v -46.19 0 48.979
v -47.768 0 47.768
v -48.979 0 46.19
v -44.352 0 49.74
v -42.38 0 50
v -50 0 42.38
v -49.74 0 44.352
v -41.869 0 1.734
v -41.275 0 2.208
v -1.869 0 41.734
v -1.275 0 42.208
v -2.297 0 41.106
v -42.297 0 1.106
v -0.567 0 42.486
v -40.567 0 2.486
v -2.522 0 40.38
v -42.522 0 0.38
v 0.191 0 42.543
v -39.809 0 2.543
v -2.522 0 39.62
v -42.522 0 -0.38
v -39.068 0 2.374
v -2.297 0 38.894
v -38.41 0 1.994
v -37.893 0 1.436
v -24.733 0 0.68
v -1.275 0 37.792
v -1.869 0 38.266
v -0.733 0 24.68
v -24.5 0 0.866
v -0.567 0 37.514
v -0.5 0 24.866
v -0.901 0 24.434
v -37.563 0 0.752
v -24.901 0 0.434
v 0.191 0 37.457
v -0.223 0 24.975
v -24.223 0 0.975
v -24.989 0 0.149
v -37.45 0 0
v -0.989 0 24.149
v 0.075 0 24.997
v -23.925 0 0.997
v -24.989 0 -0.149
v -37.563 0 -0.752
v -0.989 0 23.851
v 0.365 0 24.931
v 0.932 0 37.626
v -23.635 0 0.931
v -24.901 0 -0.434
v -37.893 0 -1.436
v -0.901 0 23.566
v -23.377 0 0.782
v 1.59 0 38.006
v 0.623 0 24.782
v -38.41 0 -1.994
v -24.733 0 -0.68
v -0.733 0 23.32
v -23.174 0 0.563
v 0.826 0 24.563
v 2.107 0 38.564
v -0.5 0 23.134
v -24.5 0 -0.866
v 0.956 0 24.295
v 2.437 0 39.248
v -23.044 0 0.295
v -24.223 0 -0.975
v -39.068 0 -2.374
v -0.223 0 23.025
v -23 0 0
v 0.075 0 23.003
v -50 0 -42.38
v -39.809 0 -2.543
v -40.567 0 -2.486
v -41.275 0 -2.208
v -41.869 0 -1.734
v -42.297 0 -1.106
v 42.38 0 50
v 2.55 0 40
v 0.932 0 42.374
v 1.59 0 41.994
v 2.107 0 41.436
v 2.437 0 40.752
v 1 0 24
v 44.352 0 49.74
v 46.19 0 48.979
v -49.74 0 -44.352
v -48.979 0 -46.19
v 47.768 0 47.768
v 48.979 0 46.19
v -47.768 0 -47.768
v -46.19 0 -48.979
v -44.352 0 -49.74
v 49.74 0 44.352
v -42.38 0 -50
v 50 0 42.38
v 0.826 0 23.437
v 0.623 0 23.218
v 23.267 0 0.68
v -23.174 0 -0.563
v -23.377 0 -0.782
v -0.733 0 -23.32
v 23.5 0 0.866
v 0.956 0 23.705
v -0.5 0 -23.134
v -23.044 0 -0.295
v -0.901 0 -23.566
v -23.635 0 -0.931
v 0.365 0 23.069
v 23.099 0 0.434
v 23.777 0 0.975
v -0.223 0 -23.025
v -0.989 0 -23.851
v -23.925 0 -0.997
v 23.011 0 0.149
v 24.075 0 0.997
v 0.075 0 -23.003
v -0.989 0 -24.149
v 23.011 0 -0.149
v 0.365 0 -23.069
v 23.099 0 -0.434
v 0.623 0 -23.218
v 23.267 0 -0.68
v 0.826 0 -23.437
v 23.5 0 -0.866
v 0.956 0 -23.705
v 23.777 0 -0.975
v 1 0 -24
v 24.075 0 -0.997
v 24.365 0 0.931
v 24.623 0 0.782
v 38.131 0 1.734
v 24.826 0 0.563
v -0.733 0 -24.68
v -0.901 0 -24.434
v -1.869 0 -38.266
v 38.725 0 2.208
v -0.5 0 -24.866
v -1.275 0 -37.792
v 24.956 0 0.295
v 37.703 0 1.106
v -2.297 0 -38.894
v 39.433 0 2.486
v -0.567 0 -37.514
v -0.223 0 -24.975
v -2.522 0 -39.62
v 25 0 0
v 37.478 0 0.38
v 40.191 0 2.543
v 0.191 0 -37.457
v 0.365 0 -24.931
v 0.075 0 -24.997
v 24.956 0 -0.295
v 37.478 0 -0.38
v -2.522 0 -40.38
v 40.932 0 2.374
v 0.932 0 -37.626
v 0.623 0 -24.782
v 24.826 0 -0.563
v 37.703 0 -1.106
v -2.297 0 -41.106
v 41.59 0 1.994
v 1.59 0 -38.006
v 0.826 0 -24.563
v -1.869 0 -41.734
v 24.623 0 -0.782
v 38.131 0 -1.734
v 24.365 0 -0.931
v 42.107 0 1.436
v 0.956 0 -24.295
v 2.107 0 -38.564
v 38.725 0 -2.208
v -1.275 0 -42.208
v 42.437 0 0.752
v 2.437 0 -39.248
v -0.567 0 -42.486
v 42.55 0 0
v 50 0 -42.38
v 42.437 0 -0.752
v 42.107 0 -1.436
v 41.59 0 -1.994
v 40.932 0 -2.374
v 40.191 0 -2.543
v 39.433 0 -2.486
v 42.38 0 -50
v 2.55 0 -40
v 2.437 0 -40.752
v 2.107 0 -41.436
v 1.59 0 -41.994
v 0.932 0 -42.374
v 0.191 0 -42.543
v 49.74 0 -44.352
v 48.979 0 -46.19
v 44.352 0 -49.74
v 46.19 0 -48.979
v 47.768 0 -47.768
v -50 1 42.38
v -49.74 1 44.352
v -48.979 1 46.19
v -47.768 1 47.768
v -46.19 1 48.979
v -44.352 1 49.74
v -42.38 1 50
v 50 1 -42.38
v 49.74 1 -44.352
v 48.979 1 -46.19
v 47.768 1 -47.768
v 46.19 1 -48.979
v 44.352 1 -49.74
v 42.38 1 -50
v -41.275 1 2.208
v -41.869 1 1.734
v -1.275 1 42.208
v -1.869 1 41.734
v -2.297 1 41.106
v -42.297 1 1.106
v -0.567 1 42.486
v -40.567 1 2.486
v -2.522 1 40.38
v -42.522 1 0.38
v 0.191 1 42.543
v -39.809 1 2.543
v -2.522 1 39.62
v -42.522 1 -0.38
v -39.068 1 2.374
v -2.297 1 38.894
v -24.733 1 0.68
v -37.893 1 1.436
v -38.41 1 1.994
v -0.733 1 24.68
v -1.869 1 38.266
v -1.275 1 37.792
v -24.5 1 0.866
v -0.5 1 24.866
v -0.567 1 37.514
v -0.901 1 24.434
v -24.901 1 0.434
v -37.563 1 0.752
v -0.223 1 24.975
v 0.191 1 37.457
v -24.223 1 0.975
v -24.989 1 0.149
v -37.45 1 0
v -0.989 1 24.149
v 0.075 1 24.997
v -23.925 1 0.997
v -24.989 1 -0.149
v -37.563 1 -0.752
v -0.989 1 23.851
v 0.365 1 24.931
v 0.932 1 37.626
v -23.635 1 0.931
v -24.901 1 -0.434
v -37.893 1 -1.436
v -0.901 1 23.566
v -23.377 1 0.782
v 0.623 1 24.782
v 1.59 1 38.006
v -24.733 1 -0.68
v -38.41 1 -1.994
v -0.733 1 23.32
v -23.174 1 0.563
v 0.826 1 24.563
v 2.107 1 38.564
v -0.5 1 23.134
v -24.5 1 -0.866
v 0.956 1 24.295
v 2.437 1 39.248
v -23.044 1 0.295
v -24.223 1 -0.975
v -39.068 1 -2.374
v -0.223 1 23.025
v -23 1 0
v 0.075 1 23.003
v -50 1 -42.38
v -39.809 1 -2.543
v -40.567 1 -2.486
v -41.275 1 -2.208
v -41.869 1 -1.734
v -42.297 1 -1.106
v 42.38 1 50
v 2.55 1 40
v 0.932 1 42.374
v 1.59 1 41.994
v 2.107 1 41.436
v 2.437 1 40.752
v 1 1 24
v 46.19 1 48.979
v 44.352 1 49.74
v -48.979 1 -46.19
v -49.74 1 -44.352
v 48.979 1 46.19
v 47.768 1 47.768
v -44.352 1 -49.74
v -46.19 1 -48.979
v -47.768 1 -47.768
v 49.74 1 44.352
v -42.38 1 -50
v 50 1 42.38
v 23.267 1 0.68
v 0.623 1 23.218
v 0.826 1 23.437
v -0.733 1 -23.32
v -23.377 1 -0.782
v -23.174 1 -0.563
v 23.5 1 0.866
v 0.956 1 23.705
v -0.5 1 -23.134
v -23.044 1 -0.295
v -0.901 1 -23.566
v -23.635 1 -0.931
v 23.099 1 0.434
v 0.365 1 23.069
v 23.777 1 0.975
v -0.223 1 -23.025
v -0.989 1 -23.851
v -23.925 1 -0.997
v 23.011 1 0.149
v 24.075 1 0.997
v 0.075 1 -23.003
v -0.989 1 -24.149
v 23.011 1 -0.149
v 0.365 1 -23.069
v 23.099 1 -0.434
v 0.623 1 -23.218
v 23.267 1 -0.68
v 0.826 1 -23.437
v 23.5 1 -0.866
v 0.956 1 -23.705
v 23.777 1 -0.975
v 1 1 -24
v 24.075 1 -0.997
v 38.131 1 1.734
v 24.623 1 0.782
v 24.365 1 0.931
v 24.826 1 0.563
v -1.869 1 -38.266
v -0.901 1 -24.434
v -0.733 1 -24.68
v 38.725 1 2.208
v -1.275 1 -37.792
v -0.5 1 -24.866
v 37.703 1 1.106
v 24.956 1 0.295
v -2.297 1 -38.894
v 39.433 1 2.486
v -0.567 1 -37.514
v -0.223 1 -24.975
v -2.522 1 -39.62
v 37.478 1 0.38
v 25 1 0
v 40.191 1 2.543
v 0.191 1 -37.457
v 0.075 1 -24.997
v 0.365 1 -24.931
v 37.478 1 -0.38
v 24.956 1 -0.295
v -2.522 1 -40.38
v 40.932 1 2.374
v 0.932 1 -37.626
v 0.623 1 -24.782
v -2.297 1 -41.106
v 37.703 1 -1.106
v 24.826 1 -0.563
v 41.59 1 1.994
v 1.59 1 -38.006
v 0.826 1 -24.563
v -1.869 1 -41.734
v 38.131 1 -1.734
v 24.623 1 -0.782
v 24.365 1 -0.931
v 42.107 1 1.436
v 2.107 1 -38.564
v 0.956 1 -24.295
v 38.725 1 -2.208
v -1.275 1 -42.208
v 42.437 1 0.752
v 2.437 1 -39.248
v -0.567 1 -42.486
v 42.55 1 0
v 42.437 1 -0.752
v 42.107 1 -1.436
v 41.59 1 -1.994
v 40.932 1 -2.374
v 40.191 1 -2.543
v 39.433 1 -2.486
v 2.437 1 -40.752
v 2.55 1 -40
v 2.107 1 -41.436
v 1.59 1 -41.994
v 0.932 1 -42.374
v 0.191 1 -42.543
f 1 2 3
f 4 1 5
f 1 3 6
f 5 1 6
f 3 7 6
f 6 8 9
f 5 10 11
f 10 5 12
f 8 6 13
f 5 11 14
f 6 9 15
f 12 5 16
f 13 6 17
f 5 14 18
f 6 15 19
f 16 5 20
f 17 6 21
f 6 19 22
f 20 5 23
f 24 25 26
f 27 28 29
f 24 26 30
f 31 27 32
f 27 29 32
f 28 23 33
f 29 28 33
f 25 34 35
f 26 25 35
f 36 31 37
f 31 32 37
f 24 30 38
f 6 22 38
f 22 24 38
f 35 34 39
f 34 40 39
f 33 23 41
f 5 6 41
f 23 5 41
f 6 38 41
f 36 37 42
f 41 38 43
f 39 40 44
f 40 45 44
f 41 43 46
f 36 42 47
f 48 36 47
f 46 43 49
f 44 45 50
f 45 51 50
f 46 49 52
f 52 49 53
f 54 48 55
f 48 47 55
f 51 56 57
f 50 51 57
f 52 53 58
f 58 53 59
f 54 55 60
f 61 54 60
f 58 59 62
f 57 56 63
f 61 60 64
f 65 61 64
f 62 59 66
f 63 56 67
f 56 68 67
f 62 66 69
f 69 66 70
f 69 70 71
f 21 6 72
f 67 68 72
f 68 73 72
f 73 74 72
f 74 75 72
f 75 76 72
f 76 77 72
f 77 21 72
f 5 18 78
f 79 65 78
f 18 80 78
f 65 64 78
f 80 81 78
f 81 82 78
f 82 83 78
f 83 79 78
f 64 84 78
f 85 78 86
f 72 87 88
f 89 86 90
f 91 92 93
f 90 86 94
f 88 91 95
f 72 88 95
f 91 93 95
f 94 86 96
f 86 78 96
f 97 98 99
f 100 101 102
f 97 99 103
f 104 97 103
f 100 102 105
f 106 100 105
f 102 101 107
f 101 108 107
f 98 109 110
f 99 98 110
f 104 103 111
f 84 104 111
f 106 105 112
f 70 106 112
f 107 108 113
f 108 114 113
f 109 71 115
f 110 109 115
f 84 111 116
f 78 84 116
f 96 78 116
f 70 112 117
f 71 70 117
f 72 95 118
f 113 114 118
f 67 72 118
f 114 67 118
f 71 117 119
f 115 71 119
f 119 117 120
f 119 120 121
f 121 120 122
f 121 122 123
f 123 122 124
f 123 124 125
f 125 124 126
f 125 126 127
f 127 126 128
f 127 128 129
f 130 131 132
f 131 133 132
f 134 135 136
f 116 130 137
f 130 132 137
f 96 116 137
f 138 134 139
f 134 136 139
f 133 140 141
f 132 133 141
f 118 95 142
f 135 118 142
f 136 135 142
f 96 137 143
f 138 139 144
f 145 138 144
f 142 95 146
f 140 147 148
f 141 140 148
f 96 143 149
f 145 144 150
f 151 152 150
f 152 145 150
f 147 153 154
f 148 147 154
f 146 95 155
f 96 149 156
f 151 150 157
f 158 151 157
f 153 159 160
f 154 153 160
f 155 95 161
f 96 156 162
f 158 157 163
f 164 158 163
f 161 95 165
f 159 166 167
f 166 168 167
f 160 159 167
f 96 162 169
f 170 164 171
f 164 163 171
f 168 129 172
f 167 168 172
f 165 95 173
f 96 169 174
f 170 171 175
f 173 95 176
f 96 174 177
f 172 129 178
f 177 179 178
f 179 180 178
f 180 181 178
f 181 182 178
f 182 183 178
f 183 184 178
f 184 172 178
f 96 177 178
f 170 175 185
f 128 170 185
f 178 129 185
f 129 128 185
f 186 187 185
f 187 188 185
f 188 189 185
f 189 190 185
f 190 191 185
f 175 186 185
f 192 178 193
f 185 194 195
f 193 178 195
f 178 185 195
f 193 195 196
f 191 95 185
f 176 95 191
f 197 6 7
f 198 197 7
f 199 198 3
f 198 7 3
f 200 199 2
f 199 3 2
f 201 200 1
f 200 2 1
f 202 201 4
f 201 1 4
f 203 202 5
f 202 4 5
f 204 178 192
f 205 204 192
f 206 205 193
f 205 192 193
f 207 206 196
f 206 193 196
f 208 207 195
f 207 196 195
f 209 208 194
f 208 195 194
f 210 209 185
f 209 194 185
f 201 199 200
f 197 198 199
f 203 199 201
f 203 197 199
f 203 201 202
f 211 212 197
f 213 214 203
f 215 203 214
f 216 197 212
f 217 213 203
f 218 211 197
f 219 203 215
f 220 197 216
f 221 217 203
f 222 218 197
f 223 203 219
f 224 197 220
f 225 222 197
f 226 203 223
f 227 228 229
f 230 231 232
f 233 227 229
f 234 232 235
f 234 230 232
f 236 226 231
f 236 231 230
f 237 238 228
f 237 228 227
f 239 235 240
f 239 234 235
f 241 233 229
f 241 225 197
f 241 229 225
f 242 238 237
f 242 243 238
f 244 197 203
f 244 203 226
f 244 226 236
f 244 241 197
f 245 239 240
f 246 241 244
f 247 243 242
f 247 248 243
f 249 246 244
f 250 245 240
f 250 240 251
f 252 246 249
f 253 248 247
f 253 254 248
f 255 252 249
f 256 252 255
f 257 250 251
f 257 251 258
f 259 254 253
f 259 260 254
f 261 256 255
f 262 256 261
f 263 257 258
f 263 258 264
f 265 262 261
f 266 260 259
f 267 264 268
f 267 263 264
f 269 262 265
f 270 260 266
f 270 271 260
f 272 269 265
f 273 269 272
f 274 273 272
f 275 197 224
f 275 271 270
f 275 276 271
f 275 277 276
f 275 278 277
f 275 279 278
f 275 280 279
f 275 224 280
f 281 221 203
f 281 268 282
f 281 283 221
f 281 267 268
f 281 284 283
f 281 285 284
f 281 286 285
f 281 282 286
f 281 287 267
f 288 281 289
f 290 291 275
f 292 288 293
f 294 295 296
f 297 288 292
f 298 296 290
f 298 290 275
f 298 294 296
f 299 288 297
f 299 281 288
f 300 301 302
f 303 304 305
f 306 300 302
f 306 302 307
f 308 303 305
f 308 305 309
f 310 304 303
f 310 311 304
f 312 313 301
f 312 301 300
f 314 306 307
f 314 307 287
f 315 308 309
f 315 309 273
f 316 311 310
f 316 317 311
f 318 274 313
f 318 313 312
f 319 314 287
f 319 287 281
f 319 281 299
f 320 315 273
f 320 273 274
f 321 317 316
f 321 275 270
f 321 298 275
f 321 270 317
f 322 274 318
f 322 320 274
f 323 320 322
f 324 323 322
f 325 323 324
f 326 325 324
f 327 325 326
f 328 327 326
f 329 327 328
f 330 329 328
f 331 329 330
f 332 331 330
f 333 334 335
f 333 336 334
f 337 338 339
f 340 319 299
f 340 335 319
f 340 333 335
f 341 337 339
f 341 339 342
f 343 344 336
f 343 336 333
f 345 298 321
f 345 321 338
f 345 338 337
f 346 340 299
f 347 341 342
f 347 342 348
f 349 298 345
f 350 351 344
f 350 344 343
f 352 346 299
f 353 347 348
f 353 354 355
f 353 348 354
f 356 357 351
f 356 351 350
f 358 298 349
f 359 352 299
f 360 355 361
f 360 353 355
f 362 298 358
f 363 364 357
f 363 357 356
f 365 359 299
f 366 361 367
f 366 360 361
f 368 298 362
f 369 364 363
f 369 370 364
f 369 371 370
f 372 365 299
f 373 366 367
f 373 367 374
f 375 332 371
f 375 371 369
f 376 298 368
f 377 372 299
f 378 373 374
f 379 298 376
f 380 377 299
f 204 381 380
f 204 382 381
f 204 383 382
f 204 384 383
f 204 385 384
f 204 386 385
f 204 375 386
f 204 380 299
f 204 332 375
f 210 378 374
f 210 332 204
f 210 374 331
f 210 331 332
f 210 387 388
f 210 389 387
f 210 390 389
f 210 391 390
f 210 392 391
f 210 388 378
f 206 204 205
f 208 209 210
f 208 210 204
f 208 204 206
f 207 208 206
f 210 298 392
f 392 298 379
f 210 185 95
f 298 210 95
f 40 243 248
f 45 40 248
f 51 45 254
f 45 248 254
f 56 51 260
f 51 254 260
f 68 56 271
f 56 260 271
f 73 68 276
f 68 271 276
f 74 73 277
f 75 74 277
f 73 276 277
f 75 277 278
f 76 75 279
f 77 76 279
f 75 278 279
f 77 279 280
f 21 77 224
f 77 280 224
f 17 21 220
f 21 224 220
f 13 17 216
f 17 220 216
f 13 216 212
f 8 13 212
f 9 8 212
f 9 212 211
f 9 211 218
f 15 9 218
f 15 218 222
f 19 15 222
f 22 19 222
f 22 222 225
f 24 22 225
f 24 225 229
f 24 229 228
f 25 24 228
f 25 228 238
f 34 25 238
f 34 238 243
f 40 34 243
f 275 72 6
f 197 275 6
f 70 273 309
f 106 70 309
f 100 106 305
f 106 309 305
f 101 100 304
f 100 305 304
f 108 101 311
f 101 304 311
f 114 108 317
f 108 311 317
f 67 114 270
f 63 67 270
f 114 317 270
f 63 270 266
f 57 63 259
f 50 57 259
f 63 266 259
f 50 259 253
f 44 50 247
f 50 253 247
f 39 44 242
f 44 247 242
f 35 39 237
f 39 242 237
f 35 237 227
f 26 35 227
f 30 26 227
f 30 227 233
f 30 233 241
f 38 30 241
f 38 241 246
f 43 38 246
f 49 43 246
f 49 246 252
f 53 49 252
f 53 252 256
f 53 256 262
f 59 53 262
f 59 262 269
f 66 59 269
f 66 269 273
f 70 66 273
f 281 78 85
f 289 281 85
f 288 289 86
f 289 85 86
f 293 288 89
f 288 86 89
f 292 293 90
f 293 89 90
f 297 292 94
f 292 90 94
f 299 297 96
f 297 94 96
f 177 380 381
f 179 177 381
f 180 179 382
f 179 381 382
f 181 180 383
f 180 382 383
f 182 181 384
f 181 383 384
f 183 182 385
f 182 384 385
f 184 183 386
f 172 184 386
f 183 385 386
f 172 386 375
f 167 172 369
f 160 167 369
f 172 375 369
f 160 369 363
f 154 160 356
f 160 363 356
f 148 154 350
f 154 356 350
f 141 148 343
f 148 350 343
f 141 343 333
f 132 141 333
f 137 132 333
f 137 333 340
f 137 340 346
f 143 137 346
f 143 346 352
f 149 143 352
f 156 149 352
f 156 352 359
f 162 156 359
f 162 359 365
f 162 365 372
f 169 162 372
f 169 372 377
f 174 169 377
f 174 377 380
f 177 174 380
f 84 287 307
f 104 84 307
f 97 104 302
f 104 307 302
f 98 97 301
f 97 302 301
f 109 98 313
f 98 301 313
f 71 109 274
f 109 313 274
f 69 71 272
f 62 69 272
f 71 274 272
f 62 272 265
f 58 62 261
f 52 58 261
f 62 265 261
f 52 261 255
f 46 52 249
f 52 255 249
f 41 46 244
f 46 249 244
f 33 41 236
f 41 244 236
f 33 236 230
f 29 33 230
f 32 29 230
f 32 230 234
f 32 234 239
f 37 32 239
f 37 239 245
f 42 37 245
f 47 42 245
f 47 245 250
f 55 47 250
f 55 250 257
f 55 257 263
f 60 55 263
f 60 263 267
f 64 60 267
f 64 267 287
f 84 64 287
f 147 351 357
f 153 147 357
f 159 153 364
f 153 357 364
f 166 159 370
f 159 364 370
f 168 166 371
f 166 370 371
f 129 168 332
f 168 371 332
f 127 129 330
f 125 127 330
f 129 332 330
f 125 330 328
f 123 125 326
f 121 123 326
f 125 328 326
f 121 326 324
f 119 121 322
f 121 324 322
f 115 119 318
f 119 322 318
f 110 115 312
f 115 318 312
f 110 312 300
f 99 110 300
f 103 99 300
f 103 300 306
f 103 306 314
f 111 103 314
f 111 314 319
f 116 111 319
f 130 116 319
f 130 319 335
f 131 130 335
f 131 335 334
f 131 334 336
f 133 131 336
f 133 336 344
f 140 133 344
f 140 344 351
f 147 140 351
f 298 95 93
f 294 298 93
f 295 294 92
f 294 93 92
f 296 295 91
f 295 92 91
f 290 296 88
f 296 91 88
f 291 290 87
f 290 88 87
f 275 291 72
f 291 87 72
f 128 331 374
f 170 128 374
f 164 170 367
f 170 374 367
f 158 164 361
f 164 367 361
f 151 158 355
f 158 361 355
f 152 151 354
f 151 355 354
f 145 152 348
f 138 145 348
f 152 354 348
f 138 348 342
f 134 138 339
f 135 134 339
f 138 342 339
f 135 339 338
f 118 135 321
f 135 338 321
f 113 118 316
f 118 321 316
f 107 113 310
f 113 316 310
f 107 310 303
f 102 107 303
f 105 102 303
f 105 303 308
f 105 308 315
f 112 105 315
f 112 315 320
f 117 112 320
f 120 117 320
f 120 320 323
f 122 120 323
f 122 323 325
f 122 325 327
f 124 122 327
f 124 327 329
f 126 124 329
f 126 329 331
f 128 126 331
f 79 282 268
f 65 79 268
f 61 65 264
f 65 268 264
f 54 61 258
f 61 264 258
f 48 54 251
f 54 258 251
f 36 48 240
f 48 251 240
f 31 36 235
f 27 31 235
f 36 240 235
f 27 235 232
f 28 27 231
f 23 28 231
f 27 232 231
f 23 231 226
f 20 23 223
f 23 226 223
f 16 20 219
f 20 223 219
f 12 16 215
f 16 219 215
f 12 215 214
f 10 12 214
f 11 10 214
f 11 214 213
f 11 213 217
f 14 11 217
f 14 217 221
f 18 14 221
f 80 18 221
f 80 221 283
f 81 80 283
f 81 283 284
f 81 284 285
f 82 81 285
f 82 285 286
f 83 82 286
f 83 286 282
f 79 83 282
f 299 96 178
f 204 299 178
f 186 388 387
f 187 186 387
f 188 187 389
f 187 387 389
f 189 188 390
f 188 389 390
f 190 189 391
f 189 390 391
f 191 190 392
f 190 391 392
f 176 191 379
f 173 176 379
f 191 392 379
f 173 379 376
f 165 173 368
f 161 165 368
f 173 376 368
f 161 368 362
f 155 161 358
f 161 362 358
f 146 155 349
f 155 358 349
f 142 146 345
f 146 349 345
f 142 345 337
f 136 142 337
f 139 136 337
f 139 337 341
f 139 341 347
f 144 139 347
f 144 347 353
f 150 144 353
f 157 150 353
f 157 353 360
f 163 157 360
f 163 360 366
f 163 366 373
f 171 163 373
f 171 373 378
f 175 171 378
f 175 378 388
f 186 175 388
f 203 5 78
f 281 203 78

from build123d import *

# Parameters (mm, degrees)
BOSS_EXTRUDE1_DEPTH = 1
SKETCH2_R           = 2.55
CUT_EXTRUDE6_DEPTH  = 2.54
SKETCH3_R           = 1
CUT_EXTRUDE7_DEPTH  = 2.54


with BuildPart() as part:
    # Sketch1 → Boss-Extrude1 (new body)
    with BuildSketch(Plane(origin=(0, 0, 0), x_dir=(1, 0, 0), z_dir=(0, 1, 0))):
        with BuildLine():
            Line((-42.38, -50), (42.38, -50))
            ThreePointArc((42.38, -50), (47.768153673, -47.768153673), (50, -42.38))
            Line((50, -42.38), (50, 42.38))
            ThreePointArc((50, 42.38), (47.768153673, 47.768153673), (42.38, 50))
            Line((42.38, 50), (-42.38, 50))
            ThreePointArc((-42.38, 50), (-47.768153673, 47.768153673), (-50, 42.38))
            Line((-50, 42.38), (-50, -42.38))
            ThreePointArc((-50, -42.38), (-47.768153673, -47.768153673), (-42.38, -50))
        make_face()
    extrude(amount=BOSS_EXTRUDE1_DEPTH)

    # Sketch2 → Cut-Extrude6 (cut)
    with BuildSketch(Plane(origin=(0, 1, 0), x_dir=(1, 0, 0), z_dir=(0, 1, 0))):
        with Locations((0, 40)):
            Circle(SKETCH2_R)
        with Locations((40, 0)):
            Circle(SKETCH2_R)
        with Locations((0, -40)):
            Circle(SKETCH2_R)
        with Locations((-40, 0)):
            Circle(SKETCH2_R)
    extrude(amount=-CUT_EXTRUDE6_DEPTH, mode=Mode.SUBTRACT)

    # Sketch3 → Cut-Extrude7 (cut)
    with BuildSketch(Plane(origin=(0, 1, 0), x_dir=(1, 0, 0), z_dir=(0, 1, 0))):
        with Locations((0, 24)):
            Circle(SKETCH3_R)
        with Locations((24, 0)):
            Circle(SKETCH3_R)
        with Locations((0, -24)):
            Circle(SKETCH3_R)
        with Locations((-24, 0)):
            Circle(SKETCH3_R)
    extrude(amount=-CUT_EXTRUDE7_DEPTH, mode=Mode.SUBTRACT)


solid = part.part
